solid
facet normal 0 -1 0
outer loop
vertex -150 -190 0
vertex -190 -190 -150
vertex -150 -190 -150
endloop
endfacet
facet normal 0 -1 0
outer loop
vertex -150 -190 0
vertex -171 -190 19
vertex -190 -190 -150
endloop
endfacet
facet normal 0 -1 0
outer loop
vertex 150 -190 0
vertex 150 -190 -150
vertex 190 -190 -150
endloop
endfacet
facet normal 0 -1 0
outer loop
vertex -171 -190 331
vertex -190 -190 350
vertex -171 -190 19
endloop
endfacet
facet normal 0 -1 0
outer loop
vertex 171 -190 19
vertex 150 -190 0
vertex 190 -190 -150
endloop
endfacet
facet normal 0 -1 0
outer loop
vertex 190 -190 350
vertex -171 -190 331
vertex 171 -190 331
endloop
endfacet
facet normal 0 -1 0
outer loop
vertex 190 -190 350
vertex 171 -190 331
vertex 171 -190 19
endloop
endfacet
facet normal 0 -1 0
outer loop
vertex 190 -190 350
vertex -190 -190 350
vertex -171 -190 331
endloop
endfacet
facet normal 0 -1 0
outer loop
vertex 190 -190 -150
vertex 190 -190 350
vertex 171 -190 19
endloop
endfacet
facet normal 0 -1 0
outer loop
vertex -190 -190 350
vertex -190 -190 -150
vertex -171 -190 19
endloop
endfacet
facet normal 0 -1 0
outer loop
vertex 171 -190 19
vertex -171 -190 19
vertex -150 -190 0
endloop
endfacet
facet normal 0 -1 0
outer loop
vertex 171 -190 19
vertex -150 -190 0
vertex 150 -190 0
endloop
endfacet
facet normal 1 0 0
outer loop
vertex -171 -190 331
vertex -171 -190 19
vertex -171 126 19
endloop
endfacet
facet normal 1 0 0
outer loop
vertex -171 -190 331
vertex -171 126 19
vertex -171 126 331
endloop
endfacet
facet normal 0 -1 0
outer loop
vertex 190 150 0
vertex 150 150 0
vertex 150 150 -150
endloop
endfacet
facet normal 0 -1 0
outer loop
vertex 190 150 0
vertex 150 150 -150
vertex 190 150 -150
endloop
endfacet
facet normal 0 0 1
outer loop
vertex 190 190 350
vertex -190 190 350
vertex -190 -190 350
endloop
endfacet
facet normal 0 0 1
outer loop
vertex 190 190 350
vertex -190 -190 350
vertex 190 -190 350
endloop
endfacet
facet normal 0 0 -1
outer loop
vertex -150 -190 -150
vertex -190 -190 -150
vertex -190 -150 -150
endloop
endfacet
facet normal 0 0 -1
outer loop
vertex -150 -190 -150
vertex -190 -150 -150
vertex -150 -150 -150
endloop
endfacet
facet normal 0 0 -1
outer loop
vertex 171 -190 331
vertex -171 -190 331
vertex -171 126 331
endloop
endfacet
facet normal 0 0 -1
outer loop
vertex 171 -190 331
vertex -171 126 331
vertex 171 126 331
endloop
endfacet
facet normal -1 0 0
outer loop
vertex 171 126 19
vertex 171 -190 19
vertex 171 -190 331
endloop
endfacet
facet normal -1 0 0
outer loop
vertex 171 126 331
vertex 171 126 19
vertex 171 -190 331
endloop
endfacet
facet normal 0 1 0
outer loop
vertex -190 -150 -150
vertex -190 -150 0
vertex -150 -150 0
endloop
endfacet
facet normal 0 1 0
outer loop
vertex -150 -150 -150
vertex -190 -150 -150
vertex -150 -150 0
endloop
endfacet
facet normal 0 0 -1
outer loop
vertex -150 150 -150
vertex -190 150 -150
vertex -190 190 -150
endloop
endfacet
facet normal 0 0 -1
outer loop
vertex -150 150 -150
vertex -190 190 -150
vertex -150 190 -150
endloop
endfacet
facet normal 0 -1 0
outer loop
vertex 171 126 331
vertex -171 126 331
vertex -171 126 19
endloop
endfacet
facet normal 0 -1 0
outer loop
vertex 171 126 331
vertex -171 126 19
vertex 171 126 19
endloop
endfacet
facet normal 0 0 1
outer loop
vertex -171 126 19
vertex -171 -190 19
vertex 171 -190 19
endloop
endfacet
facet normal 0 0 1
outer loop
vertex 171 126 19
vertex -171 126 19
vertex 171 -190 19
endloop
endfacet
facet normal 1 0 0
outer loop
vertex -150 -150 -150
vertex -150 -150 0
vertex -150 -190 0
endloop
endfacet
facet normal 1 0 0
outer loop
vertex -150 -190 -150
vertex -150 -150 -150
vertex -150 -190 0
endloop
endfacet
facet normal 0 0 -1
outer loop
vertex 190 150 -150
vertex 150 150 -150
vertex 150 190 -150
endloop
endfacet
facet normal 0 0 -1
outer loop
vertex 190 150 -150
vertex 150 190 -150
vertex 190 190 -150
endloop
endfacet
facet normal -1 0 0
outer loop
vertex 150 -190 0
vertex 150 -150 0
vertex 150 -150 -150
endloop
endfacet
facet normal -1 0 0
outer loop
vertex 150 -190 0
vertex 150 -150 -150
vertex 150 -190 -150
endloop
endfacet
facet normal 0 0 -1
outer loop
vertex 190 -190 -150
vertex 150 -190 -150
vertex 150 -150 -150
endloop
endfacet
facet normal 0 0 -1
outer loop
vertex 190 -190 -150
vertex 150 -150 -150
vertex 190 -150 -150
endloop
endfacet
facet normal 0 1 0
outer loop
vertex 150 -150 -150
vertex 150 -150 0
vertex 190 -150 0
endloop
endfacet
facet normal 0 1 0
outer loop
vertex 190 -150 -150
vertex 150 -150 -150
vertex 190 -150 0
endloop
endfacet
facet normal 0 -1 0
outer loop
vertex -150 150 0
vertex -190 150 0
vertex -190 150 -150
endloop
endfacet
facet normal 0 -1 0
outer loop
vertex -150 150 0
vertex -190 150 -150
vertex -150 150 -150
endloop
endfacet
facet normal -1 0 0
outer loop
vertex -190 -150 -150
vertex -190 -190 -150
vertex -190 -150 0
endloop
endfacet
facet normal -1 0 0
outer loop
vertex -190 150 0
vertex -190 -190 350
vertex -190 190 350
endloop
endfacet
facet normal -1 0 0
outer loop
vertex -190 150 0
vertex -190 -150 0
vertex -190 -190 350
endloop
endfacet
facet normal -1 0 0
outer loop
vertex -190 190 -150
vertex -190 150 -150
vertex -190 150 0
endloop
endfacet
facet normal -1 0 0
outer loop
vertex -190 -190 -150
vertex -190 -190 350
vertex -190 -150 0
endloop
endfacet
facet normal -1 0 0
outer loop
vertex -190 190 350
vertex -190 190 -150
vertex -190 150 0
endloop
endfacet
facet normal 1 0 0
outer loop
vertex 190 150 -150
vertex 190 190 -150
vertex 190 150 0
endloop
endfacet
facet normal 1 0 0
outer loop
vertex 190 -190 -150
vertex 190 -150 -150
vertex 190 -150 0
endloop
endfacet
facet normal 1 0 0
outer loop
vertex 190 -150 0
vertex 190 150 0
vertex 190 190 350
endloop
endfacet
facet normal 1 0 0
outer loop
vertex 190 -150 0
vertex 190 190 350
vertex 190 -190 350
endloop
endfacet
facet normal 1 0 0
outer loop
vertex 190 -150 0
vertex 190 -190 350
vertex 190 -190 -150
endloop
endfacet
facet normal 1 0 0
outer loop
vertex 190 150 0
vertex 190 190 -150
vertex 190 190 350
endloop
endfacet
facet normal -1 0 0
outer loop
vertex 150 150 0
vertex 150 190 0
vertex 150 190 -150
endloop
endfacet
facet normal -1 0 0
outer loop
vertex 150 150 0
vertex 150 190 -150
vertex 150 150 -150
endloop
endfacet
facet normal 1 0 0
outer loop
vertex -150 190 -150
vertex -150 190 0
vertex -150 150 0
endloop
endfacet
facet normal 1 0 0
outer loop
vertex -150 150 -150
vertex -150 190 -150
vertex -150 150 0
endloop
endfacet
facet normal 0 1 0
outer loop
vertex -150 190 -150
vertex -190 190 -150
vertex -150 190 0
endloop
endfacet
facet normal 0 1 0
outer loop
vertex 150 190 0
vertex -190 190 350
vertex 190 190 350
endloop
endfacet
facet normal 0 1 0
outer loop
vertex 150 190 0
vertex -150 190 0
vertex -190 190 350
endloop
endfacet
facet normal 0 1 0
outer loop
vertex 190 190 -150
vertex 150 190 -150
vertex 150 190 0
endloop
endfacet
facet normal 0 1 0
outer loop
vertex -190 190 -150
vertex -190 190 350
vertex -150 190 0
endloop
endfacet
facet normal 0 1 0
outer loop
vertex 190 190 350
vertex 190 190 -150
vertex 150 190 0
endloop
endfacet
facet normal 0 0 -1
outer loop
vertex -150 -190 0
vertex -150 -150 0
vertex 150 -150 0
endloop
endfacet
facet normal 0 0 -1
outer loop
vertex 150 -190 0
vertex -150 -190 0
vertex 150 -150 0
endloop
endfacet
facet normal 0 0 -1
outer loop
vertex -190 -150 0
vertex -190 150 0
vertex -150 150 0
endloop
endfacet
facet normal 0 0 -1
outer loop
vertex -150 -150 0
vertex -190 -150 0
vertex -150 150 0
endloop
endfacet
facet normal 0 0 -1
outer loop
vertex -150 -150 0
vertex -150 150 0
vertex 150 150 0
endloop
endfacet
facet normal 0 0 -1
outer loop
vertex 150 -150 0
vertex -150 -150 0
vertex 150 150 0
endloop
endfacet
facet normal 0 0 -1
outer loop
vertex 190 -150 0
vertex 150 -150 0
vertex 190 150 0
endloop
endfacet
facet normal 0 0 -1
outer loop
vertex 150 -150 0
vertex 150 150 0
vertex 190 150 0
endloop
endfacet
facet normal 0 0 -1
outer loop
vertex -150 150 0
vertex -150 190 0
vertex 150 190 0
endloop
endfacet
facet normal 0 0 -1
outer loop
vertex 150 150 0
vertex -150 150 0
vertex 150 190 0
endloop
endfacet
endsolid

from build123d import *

# Parameters (mm, degrees)
F0_W     = 380
F0_H     = 380
F1_DEPTH = 350
F2_W     = 342
F2_H     = 312
F3_DEPTH = 316
F4_W     = 40
F4_H     = 40
F5_DEPTH = 150


with BuildPart() as f1:
    # F0 (on Top) → F1 (new body)
    with BuildSketch(Plane.XY):
        Rectangle(F0_W, F0_H)
    extrude(amount=F1_DEPTH)

    # F2 (on face) → F3 (cut)
    with BuildSketch(Plane.XZ.offset(190)):
        with Locations((0, 175)):
            Rectangle(F2_W, F2_H)
    extrude(amount=-F3_DEPTH, mode=Mode.SUBTRACT)

    # F4 (on face) → F5 (join)
    with BuildSketch(Plane(origin=(0, 0, 0), x_dir=(1, 0, 0), z_dir=(0, 0, -1))):
        with Locations((170, 170)):
            Rectangle(F4_W, F4_H)
        with Locations((-170, -170)):
            Rectangle(F4_W, F4_H)
        with Locations((170, -170)):
            Rectangle(F4_W, F4_H)
        with Locations((-170, 170)):
            Rectangle(F4_W, F4_H)
    extrude(amount=F5_DEPTH)


solid = f1.part
